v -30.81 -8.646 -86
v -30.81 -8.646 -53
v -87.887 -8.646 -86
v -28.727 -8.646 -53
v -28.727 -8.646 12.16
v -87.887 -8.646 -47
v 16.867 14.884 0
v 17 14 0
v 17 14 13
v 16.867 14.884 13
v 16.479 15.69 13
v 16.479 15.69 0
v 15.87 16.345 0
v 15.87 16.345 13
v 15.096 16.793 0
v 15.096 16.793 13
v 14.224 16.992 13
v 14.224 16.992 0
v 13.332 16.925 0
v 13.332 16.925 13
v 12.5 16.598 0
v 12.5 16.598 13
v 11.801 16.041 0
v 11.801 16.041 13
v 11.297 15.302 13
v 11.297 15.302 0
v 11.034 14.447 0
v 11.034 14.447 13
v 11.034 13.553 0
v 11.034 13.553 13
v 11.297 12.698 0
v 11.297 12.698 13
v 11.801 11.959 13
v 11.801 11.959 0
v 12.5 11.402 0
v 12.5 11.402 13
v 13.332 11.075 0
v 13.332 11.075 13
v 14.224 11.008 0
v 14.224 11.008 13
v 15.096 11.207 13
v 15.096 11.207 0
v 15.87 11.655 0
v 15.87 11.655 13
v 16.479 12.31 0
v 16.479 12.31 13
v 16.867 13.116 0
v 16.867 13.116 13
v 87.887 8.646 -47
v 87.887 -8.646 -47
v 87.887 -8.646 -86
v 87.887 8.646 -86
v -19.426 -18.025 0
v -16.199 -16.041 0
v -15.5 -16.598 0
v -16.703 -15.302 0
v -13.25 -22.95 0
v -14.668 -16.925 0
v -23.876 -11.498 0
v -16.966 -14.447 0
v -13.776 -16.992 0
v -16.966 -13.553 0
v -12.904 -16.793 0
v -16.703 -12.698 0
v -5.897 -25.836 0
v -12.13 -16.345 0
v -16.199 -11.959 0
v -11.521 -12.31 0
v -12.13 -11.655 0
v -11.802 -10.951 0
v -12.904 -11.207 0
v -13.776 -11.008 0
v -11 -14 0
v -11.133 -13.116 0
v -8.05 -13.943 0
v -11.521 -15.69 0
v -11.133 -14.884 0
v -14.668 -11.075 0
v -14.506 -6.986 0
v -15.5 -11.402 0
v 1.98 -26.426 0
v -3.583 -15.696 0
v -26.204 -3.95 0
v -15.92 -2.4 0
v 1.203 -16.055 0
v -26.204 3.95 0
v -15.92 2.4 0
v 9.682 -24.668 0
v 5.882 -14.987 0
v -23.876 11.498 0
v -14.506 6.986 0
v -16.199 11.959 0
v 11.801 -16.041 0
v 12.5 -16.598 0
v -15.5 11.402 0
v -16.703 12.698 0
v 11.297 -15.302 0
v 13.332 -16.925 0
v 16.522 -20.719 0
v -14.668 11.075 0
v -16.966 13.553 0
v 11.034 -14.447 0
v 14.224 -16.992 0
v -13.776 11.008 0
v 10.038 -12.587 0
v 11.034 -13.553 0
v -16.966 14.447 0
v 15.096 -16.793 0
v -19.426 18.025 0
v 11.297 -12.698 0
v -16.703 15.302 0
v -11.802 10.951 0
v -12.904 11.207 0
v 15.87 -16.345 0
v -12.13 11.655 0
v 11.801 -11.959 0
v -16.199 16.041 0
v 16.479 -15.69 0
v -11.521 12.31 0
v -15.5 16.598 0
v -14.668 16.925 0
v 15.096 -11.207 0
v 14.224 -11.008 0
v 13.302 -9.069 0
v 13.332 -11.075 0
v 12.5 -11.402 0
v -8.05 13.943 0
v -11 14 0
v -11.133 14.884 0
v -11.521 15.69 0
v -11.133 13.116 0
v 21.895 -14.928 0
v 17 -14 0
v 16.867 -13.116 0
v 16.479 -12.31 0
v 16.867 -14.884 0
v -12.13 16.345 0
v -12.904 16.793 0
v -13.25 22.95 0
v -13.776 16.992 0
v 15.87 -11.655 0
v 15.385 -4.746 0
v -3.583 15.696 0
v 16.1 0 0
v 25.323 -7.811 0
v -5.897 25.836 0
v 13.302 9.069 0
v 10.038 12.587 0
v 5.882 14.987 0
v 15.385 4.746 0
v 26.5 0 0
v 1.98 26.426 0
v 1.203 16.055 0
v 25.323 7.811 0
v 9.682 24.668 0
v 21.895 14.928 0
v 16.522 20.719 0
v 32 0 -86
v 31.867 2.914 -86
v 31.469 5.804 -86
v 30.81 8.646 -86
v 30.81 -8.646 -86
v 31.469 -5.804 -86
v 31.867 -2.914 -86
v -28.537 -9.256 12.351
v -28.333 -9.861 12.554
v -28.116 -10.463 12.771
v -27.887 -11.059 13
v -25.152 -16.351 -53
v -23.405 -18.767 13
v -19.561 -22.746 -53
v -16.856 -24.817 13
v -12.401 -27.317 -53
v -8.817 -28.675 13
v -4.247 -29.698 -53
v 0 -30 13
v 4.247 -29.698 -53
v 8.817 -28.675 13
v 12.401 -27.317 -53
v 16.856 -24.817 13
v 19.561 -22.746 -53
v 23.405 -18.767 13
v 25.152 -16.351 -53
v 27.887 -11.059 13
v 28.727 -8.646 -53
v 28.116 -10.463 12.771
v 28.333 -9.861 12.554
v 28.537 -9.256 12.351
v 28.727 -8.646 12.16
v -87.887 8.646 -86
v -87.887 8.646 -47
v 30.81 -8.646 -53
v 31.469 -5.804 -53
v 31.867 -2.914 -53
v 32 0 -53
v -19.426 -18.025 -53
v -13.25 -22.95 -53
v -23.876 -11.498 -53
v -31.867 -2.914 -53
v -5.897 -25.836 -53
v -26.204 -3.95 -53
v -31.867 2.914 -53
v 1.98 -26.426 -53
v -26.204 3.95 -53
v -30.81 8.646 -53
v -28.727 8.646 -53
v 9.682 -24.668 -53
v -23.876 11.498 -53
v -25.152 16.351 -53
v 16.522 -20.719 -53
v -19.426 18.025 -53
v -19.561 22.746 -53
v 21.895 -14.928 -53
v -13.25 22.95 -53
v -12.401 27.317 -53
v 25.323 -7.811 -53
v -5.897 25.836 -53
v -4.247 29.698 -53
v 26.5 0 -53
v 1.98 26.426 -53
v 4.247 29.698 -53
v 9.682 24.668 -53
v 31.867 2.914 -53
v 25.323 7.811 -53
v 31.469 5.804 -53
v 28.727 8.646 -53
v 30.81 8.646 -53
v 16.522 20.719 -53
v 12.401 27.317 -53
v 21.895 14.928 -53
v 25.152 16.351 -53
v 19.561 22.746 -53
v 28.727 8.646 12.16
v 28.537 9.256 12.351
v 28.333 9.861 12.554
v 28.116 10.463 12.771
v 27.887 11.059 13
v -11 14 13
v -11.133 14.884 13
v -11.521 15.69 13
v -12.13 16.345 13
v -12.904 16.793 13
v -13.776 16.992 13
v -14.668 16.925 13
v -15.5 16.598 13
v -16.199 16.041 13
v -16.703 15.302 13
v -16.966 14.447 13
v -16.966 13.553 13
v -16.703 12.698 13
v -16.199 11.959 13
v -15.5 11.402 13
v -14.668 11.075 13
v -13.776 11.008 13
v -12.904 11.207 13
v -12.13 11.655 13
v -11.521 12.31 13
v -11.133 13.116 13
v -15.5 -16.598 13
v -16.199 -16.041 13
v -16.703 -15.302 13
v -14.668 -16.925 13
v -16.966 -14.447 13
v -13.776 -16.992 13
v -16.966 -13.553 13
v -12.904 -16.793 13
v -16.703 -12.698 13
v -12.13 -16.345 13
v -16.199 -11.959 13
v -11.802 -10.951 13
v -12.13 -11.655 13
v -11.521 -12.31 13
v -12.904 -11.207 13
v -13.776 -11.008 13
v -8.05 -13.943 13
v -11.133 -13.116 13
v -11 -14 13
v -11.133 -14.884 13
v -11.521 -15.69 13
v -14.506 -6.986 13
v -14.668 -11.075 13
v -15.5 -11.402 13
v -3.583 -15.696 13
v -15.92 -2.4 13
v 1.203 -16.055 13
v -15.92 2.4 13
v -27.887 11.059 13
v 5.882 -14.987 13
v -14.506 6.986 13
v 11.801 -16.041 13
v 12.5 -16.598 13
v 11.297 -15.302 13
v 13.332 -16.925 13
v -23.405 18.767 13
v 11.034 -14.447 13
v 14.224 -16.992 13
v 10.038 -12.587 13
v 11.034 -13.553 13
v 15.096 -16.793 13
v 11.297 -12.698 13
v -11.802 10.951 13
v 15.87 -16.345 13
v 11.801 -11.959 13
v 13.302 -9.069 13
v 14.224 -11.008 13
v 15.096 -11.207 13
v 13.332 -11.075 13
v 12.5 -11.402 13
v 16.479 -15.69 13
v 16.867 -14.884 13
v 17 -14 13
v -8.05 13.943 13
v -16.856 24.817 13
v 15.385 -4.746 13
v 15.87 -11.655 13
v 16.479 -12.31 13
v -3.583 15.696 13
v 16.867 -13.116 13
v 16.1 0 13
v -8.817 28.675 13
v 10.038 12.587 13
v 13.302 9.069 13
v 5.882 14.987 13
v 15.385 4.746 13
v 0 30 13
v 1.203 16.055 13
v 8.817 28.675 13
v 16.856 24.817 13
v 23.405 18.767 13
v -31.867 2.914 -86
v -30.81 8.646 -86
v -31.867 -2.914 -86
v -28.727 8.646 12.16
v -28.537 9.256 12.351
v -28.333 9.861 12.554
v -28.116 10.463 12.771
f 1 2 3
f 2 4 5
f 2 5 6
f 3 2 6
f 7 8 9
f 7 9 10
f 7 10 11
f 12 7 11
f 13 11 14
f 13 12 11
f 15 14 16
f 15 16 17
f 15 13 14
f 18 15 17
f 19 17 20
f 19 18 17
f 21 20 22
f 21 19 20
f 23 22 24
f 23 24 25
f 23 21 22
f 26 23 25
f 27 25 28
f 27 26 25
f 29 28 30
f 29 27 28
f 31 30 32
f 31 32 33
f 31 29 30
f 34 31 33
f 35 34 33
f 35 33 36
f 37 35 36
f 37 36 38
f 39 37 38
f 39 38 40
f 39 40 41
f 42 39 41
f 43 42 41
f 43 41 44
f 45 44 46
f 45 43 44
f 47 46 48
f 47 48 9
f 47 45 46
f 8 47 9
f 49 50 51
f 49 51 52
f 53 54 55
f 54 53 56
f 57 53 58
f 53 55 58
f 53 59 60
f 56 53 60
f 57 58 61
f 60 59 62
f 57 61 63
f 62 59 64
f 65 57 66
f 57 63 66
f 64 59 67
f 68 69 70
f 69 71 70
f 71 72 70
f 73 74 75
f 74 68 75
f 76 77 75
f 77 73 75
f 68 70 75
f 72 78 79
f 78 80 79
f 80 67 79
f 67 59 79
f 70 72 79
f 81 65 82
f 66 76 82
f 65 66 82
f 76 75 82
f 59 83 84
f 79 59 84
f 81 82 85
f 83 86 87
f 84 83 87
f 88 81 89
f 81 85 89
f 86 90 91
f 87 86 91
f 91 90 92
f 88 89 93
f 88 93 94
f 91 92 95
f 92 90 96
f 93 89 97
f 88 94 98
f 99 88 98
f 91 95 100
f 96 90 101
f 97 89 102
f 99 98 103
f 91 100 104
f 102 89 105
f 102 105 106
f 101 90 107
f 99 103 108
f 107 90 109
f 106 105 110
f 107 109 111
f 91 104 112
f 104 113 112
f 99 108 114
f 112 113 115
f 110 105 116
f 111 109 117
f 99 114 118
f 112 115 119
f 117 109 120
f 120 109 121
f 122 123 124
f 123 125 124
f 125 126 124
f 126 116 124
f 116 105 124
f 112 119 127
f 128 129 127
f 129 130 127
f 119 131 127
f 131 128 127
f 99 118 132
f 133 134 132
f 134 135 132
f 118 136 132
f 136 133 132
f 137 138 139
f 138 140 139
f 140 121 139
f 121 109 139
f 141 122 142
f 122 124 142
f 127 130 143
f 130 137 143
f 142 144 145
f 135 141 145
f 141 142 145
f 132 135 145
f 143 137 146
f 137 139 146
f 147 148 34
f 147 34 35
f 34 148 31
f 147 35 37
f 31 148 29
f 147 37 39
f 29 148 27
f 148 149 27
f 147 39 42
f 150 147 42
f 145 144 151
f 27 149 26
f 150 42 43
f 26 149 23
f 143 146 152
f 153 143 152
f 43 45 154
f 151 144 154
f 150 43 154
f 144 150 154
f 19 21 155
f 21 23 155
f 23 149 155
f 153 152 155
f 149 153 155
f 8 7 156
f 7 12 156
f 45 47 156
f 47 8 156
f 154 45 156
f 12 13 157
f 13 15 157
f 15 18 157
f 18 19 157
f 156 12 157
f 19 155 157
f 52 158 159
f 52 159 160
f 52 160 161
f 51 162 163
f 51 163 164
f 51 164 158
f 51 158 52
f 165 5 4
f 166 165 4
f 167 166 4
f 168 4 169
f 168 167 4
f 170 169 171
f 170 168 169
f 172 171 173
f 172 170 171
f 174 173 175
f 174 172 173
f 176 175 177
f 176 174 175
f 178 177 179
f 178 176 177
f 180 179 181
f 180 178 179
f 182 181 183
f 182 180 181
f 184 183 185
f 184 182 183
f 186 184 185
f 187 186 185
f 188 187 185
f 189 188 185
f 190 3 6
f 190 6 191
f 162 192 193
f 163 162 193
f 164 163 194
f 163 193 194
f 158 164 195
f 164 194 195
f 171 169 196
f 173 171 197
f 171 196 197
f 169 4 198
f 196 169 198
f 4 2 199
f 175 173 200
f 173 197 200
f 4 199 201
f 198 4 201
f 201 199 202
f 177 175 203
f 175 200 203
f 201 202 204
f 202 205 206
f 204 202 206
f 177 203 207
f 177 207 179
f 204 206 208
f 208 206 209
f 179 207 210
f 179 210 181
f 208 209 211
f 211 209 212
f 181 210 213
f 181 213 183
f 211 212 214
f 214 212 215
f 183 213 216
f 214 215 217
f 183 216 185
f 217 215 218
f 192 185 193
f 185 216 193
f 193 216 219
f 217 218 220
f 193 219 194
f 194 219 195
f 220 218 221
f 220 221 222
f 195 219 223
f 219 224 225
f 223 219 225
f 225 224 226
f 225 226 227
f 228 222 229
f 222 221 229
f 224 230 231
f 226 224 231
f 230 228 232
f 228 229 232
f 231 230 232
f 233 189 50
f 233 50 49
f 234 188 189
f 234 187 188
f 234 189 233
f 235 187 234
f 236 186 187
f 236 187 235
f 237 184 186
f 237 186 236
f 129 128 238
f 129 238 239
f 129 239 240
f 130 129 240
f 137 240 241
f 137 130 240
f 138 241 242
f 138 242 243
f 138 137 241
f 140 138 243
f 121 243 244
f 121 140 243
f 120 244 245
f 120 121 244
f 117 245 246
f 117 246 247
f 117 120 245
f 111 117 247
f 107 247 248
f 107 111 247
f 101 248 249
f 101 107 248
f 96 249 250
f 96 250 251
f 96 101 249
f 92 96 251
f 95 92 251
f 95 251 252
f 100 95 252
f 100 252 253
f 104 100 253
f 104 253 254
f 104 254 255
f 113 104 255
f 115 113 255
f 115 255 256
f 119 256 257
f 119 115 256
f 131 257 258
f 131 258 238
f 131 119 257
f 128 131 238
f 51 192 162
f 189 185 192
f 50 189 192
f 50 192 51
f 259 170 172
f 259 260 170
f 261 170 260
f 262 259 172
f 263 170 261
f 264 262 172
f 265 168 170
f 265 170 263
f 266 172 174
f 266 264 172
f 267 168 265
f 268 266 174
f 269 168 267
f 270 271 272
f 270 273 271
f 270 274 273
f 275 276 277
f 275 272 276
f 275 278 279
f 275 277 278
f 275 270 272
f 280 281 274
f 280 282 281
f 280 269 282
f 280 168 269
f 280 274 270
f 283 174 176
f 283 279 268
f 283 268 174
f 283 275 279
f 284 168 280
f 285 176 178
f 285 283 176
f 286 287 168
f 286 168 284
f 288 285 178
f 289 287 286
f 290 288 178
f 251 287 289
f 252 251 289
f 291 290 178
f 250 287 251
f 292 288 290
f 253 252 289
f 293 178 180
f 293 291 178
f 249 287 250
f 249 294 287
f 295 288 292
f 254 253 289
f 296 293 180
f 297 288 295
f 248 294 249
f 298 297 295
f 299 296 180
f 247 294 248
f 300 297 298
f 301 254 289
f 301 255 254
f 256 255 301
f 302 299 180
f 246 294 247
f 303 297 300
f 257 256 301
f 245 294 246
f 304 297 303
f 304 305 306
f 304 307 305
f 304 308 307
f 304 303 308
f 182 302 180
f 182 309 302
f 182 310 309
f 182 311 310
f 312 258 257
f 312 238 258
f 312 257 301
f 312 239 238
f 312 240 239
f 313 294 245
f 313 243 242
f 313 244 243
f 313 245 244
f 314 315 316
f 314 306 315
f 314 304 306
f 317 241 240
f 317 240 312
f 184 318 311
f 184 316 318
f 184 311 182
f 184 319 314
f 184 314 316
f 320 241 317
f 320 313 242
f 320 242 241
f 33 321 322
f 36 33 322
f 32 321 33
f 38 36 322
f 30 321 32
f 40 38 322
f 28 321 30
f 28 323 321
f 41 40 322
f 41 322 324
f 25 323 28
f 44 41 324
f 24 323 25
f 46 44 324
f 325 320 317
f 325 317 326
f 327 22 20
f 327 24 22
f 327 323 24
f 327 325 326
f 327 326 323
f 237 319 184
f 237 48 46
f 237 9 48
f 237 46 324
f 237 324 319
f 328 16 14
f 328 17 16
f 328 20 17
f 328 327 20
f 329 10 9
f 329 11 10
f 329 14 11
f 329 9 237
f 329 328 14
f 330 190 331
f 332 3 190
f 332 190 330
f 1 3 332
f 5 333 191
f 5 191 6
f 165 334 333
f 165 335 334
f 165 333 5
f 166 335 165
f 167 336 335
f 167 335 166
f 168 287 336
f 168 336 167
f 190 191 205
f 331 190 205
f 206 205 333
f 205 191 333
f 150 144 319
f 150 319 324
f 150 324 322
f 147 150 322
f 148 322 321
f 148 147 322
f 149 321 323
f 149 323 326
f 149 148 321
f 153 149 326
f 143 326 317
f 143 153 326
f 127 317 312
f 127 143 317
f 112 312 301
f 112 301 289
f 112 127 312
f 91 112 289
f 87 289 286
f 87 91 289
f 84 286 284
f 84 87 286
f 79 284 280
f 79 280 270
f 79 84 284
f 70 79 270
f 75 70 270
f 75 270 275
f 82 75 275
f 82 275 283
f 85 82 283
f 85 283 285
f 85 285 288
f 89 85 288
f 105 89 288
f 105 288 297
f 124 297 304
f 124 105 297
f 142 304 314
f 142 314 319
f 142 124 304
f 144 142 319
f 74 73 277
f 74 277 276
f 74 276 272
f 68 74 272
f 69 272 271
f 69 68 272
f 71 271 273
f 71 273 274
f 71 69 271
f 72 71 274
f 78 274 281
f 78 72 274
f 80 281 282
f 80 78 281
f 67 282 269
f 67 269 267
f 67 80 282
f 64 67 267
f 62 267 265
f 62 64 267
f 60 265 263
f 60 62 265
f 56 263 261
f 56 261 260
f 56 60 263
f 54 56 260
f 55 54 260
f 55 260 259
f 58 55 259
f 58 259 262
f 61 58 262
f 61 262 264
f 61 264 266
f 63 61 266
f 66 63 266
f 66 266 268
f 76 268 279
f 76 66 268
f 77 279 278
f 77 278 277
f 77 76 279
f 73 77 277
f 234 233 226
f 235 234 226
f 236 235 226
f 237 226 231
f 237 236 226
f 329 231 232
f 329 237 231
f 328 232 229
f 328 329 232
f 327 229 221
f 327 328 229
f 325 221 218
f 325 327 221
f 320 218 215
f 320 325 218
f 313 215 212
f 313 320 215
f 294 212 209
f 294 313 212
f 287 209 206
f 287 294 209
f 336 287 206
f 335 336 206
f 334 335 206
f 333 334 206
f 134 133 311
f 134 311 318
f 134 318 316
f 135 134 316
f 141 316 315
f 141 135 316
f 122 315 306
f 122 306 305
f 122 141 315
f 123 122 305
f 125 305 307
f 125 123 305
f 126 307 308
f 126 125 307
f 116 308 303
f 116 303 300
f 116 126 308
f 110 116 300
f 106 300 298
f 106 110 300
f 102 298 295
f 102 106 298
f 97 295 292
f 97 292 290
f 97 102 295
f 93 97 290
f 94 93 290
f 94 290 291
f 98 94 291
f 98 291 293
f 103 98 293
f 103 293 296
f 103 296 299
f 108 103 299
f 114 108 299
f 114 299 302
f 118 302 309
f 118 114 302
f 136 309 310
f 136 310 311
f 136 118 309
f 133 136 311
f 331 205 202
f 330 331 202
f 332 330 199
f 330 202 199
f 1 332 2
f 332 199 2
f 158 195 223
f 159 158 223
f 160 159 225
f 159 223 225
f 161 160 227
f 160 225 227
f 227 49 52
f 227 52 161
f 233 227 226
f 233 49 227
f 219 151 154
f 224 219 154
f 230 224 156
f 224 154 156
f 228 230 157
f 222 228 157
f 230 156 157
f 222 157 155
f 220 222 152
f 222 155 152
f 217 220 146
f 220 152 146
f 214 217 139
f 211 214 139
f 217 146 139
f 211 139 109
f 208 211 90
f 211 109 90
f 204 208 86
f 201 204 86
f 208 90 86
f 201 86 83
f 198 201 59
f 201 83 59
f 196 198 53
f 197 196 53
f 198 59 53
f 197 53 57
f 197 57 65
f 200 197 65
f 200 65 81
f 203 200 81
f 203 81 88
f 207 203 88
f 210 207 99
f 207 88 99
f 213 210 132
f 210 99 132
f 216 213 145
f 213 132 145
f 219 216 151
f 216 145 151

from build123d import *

# Parameters (mm, degrees)
F0_R     = 26.5
F0_R_2   = 3
F0_R_3   = 16.1
F1_DEPTH = 13
F2_DEPTH = 53
F3_SIZE  = 60
F5_DEPTH = 33


with BuildPart() as f1:
    # F0 (on Top) → F1 (new body)
    with BuildSketch(Plane.XY):
        with BuildLine():
            ThreePointArc((28.7271796725, -8.6457589641), (29.6800892028, -4.3694742147), (30, 0))
            ThreePointArc((30, 0), (29.6800892028, 4.3694742147), (28.7271796725, 8.6457589641))
            ThreePointArc((28.7271796725, 8.6457589641), (0, 30), (-28.7271796725, 8.6457589641))
            ThreePointArc((-28.7271796725, 8.6457589641), (-30, 0), (-28.7271796725, -8.6457589641))
            ThreePointArc((-28.7271796725, -8.6457589641), (0, -30), (28.7271796725, -8.6457589641))
        make_face()
        Circle(F0_R, mode=Mode.SUBTRACT)
        Circle(F0_R)
        with Locations((-14, -14)):
            Circle(F0_R_2, mode=Mode.SUBTRACT)
        with Locations((14, -14)):
            Circle(F0_R_2, mode=Mode.SUBTRACT)
        with Locations((-14, 14)):
            Circle(F0_R_2, mode=Mode.SUBTRACT)
        Circle(F0_R_3, mode=Mode.SUBTRACT)
        with Locations((14, 14)):
            Circle(F0_R_2, mode=Mode.SUBTRACT)
        with BuildLine():
            ThreePointArc((28.7271796725, 8.6457589641), (29.6800892028, 4.3694742147), (30, 0))
            ThreePointArc((30, 0), (29.6800892028, -4.3694742147), (28.7271796725, -8.6457589641))
            Line((28.7271796725, -8.6457589641), (87.8872200847, -8.6457589641))
            Line((87.8872200847, -8.6457589641), (87.8872200847, 8.6457589641))
            Line((87.8872200847, 8.6457589641), (28.7271796725, 8.6457589641))
        make_face()
        with BuildLine():
            ThreePointArc((-28.7271796725, -8.6457589641), (-30, 0), (-28.7271796725, 8.6457589641))
            Line((-28.7271796725, 8.6457589641), (-87.8872200847, 8.6457589641))
            Line((-87.8872200847, 8.6457589641), (-87.8872200847, -8.6457589641))
            Line((-87.8872200847, -8.6457589641), (-28.7271796725, -8.6457589641))
        make_face()
    extrude(amount=F1_DEPTH)

    # F0 (on Top) → F2 (join)
    with BuildSketch(Plane.XY):
        with BuildLine():
            ThreePointArc((28.7271796725, -8.6457589641), (29.6800892028, -4.3694742147), (30, 0))
            ThreePointArc((30, 0), (29.6800892028, 4.3694742147), (28.7271796725, 8.6457589641))
            ThreePointArc((28.7271796725, 8.6457589641), (0, 30), (-28.7271796725, 8.6457589641))
            ThreePointArc((-28.7271796725, 8.6457589641), (-30, 0), (-28.7271796725, -8.6457589641))
            ThreePointArc((-28.7271796725, -8.6457589641), (0, -30), (28.7271796725, -8.6457589641))
        make_face()
        Circle(F0_R, mode=Mode.SUBTRACT)
        with BuildLine():
            ThreePointArc((28.7271796725, 8.6457589641), (29.6800892028, 4.3694742147), (30, 0))
            ThreePointArc((30, 0), (29.6800892028, -4.3694742147), (28.7271796725, -8.6457589641))
            Line((28.7271796725, -8.6457589641), (87.8872200847, -8.6457589641))
            Line((87.8872200847, -8.6457589641), (87.8872200847, 8.6457589641))
            Line((87.8872200847, 8.6457589641), (28.7271796725, 8.6457589641))
        make_face()
        with BuildLine():
            ThreePointArc((-28.7271796725, -8.6457589641), (-30, 0), (-28.7271796725, 8.6457589641))
            Line((-28.7271796725, 8.6457589641), (-87.8872200847, 8.6457589641))
            Line((-87.8872200847, 8.6457589641), (-87.8872200847, -8.6457589641))
            Line((-87.8872200847, -8.6457589641), (-28.7271796725, -8.6457589641))
        make_face()
    extrude(amount=-F2_DEPTH)

    # F3
    f3_edges = [f1.edges().sort_by_distance(p)[0] for p in [
        (87.88722, 0, 13),
        (-87.88722, 0, 13),
    ]]
    chamfer(f3_edges, length=F3_SIZE)

    # F4 (on face) → F5 (join)
    with BuildSketch(Plane(origin=(0, 0, -53), x_dir=(1, 0, 0), z_dir=(0, 0, -1))):
        with BuildLine():
            ThreePointArc((-30.8099148317, -8.6457589641), (-32, 0), (-30.8099148317, 8.6457589641))
            Line((-30.8099148317, 8.6457589641), (-87.8872200847, 8.6457589641))
            Line((-87.8872200847, 8.6457589641), (-87.8872200847, -8.6457589641))
            Line((-87.8872200847, -8.6457589641), (-30.8099148317, -8.6457589641))
        make_face()
        with BuildLine():
            ThreePointArc((30.8099148317, 8.6457589641), (31.7010825889, 4.3636409904), (32, 0))
            ThreePointArc((32, 0), (31.7010825889, -4.3636409904), (30.8099148317, -8.6457589641))
            Line((30.8099148317, -8.6457589641), (87.8872200847, -8.6457589641))
            Line((87.8872200847, -8.6457589641), (87.8872200847, 8.6457589641))
            Line((87.8872200847, 8.6457589641), (30.8099148317, 8.6457589641))
        make_face()
    extrude(amount=F5_DEPTH)


solid = f1.part
